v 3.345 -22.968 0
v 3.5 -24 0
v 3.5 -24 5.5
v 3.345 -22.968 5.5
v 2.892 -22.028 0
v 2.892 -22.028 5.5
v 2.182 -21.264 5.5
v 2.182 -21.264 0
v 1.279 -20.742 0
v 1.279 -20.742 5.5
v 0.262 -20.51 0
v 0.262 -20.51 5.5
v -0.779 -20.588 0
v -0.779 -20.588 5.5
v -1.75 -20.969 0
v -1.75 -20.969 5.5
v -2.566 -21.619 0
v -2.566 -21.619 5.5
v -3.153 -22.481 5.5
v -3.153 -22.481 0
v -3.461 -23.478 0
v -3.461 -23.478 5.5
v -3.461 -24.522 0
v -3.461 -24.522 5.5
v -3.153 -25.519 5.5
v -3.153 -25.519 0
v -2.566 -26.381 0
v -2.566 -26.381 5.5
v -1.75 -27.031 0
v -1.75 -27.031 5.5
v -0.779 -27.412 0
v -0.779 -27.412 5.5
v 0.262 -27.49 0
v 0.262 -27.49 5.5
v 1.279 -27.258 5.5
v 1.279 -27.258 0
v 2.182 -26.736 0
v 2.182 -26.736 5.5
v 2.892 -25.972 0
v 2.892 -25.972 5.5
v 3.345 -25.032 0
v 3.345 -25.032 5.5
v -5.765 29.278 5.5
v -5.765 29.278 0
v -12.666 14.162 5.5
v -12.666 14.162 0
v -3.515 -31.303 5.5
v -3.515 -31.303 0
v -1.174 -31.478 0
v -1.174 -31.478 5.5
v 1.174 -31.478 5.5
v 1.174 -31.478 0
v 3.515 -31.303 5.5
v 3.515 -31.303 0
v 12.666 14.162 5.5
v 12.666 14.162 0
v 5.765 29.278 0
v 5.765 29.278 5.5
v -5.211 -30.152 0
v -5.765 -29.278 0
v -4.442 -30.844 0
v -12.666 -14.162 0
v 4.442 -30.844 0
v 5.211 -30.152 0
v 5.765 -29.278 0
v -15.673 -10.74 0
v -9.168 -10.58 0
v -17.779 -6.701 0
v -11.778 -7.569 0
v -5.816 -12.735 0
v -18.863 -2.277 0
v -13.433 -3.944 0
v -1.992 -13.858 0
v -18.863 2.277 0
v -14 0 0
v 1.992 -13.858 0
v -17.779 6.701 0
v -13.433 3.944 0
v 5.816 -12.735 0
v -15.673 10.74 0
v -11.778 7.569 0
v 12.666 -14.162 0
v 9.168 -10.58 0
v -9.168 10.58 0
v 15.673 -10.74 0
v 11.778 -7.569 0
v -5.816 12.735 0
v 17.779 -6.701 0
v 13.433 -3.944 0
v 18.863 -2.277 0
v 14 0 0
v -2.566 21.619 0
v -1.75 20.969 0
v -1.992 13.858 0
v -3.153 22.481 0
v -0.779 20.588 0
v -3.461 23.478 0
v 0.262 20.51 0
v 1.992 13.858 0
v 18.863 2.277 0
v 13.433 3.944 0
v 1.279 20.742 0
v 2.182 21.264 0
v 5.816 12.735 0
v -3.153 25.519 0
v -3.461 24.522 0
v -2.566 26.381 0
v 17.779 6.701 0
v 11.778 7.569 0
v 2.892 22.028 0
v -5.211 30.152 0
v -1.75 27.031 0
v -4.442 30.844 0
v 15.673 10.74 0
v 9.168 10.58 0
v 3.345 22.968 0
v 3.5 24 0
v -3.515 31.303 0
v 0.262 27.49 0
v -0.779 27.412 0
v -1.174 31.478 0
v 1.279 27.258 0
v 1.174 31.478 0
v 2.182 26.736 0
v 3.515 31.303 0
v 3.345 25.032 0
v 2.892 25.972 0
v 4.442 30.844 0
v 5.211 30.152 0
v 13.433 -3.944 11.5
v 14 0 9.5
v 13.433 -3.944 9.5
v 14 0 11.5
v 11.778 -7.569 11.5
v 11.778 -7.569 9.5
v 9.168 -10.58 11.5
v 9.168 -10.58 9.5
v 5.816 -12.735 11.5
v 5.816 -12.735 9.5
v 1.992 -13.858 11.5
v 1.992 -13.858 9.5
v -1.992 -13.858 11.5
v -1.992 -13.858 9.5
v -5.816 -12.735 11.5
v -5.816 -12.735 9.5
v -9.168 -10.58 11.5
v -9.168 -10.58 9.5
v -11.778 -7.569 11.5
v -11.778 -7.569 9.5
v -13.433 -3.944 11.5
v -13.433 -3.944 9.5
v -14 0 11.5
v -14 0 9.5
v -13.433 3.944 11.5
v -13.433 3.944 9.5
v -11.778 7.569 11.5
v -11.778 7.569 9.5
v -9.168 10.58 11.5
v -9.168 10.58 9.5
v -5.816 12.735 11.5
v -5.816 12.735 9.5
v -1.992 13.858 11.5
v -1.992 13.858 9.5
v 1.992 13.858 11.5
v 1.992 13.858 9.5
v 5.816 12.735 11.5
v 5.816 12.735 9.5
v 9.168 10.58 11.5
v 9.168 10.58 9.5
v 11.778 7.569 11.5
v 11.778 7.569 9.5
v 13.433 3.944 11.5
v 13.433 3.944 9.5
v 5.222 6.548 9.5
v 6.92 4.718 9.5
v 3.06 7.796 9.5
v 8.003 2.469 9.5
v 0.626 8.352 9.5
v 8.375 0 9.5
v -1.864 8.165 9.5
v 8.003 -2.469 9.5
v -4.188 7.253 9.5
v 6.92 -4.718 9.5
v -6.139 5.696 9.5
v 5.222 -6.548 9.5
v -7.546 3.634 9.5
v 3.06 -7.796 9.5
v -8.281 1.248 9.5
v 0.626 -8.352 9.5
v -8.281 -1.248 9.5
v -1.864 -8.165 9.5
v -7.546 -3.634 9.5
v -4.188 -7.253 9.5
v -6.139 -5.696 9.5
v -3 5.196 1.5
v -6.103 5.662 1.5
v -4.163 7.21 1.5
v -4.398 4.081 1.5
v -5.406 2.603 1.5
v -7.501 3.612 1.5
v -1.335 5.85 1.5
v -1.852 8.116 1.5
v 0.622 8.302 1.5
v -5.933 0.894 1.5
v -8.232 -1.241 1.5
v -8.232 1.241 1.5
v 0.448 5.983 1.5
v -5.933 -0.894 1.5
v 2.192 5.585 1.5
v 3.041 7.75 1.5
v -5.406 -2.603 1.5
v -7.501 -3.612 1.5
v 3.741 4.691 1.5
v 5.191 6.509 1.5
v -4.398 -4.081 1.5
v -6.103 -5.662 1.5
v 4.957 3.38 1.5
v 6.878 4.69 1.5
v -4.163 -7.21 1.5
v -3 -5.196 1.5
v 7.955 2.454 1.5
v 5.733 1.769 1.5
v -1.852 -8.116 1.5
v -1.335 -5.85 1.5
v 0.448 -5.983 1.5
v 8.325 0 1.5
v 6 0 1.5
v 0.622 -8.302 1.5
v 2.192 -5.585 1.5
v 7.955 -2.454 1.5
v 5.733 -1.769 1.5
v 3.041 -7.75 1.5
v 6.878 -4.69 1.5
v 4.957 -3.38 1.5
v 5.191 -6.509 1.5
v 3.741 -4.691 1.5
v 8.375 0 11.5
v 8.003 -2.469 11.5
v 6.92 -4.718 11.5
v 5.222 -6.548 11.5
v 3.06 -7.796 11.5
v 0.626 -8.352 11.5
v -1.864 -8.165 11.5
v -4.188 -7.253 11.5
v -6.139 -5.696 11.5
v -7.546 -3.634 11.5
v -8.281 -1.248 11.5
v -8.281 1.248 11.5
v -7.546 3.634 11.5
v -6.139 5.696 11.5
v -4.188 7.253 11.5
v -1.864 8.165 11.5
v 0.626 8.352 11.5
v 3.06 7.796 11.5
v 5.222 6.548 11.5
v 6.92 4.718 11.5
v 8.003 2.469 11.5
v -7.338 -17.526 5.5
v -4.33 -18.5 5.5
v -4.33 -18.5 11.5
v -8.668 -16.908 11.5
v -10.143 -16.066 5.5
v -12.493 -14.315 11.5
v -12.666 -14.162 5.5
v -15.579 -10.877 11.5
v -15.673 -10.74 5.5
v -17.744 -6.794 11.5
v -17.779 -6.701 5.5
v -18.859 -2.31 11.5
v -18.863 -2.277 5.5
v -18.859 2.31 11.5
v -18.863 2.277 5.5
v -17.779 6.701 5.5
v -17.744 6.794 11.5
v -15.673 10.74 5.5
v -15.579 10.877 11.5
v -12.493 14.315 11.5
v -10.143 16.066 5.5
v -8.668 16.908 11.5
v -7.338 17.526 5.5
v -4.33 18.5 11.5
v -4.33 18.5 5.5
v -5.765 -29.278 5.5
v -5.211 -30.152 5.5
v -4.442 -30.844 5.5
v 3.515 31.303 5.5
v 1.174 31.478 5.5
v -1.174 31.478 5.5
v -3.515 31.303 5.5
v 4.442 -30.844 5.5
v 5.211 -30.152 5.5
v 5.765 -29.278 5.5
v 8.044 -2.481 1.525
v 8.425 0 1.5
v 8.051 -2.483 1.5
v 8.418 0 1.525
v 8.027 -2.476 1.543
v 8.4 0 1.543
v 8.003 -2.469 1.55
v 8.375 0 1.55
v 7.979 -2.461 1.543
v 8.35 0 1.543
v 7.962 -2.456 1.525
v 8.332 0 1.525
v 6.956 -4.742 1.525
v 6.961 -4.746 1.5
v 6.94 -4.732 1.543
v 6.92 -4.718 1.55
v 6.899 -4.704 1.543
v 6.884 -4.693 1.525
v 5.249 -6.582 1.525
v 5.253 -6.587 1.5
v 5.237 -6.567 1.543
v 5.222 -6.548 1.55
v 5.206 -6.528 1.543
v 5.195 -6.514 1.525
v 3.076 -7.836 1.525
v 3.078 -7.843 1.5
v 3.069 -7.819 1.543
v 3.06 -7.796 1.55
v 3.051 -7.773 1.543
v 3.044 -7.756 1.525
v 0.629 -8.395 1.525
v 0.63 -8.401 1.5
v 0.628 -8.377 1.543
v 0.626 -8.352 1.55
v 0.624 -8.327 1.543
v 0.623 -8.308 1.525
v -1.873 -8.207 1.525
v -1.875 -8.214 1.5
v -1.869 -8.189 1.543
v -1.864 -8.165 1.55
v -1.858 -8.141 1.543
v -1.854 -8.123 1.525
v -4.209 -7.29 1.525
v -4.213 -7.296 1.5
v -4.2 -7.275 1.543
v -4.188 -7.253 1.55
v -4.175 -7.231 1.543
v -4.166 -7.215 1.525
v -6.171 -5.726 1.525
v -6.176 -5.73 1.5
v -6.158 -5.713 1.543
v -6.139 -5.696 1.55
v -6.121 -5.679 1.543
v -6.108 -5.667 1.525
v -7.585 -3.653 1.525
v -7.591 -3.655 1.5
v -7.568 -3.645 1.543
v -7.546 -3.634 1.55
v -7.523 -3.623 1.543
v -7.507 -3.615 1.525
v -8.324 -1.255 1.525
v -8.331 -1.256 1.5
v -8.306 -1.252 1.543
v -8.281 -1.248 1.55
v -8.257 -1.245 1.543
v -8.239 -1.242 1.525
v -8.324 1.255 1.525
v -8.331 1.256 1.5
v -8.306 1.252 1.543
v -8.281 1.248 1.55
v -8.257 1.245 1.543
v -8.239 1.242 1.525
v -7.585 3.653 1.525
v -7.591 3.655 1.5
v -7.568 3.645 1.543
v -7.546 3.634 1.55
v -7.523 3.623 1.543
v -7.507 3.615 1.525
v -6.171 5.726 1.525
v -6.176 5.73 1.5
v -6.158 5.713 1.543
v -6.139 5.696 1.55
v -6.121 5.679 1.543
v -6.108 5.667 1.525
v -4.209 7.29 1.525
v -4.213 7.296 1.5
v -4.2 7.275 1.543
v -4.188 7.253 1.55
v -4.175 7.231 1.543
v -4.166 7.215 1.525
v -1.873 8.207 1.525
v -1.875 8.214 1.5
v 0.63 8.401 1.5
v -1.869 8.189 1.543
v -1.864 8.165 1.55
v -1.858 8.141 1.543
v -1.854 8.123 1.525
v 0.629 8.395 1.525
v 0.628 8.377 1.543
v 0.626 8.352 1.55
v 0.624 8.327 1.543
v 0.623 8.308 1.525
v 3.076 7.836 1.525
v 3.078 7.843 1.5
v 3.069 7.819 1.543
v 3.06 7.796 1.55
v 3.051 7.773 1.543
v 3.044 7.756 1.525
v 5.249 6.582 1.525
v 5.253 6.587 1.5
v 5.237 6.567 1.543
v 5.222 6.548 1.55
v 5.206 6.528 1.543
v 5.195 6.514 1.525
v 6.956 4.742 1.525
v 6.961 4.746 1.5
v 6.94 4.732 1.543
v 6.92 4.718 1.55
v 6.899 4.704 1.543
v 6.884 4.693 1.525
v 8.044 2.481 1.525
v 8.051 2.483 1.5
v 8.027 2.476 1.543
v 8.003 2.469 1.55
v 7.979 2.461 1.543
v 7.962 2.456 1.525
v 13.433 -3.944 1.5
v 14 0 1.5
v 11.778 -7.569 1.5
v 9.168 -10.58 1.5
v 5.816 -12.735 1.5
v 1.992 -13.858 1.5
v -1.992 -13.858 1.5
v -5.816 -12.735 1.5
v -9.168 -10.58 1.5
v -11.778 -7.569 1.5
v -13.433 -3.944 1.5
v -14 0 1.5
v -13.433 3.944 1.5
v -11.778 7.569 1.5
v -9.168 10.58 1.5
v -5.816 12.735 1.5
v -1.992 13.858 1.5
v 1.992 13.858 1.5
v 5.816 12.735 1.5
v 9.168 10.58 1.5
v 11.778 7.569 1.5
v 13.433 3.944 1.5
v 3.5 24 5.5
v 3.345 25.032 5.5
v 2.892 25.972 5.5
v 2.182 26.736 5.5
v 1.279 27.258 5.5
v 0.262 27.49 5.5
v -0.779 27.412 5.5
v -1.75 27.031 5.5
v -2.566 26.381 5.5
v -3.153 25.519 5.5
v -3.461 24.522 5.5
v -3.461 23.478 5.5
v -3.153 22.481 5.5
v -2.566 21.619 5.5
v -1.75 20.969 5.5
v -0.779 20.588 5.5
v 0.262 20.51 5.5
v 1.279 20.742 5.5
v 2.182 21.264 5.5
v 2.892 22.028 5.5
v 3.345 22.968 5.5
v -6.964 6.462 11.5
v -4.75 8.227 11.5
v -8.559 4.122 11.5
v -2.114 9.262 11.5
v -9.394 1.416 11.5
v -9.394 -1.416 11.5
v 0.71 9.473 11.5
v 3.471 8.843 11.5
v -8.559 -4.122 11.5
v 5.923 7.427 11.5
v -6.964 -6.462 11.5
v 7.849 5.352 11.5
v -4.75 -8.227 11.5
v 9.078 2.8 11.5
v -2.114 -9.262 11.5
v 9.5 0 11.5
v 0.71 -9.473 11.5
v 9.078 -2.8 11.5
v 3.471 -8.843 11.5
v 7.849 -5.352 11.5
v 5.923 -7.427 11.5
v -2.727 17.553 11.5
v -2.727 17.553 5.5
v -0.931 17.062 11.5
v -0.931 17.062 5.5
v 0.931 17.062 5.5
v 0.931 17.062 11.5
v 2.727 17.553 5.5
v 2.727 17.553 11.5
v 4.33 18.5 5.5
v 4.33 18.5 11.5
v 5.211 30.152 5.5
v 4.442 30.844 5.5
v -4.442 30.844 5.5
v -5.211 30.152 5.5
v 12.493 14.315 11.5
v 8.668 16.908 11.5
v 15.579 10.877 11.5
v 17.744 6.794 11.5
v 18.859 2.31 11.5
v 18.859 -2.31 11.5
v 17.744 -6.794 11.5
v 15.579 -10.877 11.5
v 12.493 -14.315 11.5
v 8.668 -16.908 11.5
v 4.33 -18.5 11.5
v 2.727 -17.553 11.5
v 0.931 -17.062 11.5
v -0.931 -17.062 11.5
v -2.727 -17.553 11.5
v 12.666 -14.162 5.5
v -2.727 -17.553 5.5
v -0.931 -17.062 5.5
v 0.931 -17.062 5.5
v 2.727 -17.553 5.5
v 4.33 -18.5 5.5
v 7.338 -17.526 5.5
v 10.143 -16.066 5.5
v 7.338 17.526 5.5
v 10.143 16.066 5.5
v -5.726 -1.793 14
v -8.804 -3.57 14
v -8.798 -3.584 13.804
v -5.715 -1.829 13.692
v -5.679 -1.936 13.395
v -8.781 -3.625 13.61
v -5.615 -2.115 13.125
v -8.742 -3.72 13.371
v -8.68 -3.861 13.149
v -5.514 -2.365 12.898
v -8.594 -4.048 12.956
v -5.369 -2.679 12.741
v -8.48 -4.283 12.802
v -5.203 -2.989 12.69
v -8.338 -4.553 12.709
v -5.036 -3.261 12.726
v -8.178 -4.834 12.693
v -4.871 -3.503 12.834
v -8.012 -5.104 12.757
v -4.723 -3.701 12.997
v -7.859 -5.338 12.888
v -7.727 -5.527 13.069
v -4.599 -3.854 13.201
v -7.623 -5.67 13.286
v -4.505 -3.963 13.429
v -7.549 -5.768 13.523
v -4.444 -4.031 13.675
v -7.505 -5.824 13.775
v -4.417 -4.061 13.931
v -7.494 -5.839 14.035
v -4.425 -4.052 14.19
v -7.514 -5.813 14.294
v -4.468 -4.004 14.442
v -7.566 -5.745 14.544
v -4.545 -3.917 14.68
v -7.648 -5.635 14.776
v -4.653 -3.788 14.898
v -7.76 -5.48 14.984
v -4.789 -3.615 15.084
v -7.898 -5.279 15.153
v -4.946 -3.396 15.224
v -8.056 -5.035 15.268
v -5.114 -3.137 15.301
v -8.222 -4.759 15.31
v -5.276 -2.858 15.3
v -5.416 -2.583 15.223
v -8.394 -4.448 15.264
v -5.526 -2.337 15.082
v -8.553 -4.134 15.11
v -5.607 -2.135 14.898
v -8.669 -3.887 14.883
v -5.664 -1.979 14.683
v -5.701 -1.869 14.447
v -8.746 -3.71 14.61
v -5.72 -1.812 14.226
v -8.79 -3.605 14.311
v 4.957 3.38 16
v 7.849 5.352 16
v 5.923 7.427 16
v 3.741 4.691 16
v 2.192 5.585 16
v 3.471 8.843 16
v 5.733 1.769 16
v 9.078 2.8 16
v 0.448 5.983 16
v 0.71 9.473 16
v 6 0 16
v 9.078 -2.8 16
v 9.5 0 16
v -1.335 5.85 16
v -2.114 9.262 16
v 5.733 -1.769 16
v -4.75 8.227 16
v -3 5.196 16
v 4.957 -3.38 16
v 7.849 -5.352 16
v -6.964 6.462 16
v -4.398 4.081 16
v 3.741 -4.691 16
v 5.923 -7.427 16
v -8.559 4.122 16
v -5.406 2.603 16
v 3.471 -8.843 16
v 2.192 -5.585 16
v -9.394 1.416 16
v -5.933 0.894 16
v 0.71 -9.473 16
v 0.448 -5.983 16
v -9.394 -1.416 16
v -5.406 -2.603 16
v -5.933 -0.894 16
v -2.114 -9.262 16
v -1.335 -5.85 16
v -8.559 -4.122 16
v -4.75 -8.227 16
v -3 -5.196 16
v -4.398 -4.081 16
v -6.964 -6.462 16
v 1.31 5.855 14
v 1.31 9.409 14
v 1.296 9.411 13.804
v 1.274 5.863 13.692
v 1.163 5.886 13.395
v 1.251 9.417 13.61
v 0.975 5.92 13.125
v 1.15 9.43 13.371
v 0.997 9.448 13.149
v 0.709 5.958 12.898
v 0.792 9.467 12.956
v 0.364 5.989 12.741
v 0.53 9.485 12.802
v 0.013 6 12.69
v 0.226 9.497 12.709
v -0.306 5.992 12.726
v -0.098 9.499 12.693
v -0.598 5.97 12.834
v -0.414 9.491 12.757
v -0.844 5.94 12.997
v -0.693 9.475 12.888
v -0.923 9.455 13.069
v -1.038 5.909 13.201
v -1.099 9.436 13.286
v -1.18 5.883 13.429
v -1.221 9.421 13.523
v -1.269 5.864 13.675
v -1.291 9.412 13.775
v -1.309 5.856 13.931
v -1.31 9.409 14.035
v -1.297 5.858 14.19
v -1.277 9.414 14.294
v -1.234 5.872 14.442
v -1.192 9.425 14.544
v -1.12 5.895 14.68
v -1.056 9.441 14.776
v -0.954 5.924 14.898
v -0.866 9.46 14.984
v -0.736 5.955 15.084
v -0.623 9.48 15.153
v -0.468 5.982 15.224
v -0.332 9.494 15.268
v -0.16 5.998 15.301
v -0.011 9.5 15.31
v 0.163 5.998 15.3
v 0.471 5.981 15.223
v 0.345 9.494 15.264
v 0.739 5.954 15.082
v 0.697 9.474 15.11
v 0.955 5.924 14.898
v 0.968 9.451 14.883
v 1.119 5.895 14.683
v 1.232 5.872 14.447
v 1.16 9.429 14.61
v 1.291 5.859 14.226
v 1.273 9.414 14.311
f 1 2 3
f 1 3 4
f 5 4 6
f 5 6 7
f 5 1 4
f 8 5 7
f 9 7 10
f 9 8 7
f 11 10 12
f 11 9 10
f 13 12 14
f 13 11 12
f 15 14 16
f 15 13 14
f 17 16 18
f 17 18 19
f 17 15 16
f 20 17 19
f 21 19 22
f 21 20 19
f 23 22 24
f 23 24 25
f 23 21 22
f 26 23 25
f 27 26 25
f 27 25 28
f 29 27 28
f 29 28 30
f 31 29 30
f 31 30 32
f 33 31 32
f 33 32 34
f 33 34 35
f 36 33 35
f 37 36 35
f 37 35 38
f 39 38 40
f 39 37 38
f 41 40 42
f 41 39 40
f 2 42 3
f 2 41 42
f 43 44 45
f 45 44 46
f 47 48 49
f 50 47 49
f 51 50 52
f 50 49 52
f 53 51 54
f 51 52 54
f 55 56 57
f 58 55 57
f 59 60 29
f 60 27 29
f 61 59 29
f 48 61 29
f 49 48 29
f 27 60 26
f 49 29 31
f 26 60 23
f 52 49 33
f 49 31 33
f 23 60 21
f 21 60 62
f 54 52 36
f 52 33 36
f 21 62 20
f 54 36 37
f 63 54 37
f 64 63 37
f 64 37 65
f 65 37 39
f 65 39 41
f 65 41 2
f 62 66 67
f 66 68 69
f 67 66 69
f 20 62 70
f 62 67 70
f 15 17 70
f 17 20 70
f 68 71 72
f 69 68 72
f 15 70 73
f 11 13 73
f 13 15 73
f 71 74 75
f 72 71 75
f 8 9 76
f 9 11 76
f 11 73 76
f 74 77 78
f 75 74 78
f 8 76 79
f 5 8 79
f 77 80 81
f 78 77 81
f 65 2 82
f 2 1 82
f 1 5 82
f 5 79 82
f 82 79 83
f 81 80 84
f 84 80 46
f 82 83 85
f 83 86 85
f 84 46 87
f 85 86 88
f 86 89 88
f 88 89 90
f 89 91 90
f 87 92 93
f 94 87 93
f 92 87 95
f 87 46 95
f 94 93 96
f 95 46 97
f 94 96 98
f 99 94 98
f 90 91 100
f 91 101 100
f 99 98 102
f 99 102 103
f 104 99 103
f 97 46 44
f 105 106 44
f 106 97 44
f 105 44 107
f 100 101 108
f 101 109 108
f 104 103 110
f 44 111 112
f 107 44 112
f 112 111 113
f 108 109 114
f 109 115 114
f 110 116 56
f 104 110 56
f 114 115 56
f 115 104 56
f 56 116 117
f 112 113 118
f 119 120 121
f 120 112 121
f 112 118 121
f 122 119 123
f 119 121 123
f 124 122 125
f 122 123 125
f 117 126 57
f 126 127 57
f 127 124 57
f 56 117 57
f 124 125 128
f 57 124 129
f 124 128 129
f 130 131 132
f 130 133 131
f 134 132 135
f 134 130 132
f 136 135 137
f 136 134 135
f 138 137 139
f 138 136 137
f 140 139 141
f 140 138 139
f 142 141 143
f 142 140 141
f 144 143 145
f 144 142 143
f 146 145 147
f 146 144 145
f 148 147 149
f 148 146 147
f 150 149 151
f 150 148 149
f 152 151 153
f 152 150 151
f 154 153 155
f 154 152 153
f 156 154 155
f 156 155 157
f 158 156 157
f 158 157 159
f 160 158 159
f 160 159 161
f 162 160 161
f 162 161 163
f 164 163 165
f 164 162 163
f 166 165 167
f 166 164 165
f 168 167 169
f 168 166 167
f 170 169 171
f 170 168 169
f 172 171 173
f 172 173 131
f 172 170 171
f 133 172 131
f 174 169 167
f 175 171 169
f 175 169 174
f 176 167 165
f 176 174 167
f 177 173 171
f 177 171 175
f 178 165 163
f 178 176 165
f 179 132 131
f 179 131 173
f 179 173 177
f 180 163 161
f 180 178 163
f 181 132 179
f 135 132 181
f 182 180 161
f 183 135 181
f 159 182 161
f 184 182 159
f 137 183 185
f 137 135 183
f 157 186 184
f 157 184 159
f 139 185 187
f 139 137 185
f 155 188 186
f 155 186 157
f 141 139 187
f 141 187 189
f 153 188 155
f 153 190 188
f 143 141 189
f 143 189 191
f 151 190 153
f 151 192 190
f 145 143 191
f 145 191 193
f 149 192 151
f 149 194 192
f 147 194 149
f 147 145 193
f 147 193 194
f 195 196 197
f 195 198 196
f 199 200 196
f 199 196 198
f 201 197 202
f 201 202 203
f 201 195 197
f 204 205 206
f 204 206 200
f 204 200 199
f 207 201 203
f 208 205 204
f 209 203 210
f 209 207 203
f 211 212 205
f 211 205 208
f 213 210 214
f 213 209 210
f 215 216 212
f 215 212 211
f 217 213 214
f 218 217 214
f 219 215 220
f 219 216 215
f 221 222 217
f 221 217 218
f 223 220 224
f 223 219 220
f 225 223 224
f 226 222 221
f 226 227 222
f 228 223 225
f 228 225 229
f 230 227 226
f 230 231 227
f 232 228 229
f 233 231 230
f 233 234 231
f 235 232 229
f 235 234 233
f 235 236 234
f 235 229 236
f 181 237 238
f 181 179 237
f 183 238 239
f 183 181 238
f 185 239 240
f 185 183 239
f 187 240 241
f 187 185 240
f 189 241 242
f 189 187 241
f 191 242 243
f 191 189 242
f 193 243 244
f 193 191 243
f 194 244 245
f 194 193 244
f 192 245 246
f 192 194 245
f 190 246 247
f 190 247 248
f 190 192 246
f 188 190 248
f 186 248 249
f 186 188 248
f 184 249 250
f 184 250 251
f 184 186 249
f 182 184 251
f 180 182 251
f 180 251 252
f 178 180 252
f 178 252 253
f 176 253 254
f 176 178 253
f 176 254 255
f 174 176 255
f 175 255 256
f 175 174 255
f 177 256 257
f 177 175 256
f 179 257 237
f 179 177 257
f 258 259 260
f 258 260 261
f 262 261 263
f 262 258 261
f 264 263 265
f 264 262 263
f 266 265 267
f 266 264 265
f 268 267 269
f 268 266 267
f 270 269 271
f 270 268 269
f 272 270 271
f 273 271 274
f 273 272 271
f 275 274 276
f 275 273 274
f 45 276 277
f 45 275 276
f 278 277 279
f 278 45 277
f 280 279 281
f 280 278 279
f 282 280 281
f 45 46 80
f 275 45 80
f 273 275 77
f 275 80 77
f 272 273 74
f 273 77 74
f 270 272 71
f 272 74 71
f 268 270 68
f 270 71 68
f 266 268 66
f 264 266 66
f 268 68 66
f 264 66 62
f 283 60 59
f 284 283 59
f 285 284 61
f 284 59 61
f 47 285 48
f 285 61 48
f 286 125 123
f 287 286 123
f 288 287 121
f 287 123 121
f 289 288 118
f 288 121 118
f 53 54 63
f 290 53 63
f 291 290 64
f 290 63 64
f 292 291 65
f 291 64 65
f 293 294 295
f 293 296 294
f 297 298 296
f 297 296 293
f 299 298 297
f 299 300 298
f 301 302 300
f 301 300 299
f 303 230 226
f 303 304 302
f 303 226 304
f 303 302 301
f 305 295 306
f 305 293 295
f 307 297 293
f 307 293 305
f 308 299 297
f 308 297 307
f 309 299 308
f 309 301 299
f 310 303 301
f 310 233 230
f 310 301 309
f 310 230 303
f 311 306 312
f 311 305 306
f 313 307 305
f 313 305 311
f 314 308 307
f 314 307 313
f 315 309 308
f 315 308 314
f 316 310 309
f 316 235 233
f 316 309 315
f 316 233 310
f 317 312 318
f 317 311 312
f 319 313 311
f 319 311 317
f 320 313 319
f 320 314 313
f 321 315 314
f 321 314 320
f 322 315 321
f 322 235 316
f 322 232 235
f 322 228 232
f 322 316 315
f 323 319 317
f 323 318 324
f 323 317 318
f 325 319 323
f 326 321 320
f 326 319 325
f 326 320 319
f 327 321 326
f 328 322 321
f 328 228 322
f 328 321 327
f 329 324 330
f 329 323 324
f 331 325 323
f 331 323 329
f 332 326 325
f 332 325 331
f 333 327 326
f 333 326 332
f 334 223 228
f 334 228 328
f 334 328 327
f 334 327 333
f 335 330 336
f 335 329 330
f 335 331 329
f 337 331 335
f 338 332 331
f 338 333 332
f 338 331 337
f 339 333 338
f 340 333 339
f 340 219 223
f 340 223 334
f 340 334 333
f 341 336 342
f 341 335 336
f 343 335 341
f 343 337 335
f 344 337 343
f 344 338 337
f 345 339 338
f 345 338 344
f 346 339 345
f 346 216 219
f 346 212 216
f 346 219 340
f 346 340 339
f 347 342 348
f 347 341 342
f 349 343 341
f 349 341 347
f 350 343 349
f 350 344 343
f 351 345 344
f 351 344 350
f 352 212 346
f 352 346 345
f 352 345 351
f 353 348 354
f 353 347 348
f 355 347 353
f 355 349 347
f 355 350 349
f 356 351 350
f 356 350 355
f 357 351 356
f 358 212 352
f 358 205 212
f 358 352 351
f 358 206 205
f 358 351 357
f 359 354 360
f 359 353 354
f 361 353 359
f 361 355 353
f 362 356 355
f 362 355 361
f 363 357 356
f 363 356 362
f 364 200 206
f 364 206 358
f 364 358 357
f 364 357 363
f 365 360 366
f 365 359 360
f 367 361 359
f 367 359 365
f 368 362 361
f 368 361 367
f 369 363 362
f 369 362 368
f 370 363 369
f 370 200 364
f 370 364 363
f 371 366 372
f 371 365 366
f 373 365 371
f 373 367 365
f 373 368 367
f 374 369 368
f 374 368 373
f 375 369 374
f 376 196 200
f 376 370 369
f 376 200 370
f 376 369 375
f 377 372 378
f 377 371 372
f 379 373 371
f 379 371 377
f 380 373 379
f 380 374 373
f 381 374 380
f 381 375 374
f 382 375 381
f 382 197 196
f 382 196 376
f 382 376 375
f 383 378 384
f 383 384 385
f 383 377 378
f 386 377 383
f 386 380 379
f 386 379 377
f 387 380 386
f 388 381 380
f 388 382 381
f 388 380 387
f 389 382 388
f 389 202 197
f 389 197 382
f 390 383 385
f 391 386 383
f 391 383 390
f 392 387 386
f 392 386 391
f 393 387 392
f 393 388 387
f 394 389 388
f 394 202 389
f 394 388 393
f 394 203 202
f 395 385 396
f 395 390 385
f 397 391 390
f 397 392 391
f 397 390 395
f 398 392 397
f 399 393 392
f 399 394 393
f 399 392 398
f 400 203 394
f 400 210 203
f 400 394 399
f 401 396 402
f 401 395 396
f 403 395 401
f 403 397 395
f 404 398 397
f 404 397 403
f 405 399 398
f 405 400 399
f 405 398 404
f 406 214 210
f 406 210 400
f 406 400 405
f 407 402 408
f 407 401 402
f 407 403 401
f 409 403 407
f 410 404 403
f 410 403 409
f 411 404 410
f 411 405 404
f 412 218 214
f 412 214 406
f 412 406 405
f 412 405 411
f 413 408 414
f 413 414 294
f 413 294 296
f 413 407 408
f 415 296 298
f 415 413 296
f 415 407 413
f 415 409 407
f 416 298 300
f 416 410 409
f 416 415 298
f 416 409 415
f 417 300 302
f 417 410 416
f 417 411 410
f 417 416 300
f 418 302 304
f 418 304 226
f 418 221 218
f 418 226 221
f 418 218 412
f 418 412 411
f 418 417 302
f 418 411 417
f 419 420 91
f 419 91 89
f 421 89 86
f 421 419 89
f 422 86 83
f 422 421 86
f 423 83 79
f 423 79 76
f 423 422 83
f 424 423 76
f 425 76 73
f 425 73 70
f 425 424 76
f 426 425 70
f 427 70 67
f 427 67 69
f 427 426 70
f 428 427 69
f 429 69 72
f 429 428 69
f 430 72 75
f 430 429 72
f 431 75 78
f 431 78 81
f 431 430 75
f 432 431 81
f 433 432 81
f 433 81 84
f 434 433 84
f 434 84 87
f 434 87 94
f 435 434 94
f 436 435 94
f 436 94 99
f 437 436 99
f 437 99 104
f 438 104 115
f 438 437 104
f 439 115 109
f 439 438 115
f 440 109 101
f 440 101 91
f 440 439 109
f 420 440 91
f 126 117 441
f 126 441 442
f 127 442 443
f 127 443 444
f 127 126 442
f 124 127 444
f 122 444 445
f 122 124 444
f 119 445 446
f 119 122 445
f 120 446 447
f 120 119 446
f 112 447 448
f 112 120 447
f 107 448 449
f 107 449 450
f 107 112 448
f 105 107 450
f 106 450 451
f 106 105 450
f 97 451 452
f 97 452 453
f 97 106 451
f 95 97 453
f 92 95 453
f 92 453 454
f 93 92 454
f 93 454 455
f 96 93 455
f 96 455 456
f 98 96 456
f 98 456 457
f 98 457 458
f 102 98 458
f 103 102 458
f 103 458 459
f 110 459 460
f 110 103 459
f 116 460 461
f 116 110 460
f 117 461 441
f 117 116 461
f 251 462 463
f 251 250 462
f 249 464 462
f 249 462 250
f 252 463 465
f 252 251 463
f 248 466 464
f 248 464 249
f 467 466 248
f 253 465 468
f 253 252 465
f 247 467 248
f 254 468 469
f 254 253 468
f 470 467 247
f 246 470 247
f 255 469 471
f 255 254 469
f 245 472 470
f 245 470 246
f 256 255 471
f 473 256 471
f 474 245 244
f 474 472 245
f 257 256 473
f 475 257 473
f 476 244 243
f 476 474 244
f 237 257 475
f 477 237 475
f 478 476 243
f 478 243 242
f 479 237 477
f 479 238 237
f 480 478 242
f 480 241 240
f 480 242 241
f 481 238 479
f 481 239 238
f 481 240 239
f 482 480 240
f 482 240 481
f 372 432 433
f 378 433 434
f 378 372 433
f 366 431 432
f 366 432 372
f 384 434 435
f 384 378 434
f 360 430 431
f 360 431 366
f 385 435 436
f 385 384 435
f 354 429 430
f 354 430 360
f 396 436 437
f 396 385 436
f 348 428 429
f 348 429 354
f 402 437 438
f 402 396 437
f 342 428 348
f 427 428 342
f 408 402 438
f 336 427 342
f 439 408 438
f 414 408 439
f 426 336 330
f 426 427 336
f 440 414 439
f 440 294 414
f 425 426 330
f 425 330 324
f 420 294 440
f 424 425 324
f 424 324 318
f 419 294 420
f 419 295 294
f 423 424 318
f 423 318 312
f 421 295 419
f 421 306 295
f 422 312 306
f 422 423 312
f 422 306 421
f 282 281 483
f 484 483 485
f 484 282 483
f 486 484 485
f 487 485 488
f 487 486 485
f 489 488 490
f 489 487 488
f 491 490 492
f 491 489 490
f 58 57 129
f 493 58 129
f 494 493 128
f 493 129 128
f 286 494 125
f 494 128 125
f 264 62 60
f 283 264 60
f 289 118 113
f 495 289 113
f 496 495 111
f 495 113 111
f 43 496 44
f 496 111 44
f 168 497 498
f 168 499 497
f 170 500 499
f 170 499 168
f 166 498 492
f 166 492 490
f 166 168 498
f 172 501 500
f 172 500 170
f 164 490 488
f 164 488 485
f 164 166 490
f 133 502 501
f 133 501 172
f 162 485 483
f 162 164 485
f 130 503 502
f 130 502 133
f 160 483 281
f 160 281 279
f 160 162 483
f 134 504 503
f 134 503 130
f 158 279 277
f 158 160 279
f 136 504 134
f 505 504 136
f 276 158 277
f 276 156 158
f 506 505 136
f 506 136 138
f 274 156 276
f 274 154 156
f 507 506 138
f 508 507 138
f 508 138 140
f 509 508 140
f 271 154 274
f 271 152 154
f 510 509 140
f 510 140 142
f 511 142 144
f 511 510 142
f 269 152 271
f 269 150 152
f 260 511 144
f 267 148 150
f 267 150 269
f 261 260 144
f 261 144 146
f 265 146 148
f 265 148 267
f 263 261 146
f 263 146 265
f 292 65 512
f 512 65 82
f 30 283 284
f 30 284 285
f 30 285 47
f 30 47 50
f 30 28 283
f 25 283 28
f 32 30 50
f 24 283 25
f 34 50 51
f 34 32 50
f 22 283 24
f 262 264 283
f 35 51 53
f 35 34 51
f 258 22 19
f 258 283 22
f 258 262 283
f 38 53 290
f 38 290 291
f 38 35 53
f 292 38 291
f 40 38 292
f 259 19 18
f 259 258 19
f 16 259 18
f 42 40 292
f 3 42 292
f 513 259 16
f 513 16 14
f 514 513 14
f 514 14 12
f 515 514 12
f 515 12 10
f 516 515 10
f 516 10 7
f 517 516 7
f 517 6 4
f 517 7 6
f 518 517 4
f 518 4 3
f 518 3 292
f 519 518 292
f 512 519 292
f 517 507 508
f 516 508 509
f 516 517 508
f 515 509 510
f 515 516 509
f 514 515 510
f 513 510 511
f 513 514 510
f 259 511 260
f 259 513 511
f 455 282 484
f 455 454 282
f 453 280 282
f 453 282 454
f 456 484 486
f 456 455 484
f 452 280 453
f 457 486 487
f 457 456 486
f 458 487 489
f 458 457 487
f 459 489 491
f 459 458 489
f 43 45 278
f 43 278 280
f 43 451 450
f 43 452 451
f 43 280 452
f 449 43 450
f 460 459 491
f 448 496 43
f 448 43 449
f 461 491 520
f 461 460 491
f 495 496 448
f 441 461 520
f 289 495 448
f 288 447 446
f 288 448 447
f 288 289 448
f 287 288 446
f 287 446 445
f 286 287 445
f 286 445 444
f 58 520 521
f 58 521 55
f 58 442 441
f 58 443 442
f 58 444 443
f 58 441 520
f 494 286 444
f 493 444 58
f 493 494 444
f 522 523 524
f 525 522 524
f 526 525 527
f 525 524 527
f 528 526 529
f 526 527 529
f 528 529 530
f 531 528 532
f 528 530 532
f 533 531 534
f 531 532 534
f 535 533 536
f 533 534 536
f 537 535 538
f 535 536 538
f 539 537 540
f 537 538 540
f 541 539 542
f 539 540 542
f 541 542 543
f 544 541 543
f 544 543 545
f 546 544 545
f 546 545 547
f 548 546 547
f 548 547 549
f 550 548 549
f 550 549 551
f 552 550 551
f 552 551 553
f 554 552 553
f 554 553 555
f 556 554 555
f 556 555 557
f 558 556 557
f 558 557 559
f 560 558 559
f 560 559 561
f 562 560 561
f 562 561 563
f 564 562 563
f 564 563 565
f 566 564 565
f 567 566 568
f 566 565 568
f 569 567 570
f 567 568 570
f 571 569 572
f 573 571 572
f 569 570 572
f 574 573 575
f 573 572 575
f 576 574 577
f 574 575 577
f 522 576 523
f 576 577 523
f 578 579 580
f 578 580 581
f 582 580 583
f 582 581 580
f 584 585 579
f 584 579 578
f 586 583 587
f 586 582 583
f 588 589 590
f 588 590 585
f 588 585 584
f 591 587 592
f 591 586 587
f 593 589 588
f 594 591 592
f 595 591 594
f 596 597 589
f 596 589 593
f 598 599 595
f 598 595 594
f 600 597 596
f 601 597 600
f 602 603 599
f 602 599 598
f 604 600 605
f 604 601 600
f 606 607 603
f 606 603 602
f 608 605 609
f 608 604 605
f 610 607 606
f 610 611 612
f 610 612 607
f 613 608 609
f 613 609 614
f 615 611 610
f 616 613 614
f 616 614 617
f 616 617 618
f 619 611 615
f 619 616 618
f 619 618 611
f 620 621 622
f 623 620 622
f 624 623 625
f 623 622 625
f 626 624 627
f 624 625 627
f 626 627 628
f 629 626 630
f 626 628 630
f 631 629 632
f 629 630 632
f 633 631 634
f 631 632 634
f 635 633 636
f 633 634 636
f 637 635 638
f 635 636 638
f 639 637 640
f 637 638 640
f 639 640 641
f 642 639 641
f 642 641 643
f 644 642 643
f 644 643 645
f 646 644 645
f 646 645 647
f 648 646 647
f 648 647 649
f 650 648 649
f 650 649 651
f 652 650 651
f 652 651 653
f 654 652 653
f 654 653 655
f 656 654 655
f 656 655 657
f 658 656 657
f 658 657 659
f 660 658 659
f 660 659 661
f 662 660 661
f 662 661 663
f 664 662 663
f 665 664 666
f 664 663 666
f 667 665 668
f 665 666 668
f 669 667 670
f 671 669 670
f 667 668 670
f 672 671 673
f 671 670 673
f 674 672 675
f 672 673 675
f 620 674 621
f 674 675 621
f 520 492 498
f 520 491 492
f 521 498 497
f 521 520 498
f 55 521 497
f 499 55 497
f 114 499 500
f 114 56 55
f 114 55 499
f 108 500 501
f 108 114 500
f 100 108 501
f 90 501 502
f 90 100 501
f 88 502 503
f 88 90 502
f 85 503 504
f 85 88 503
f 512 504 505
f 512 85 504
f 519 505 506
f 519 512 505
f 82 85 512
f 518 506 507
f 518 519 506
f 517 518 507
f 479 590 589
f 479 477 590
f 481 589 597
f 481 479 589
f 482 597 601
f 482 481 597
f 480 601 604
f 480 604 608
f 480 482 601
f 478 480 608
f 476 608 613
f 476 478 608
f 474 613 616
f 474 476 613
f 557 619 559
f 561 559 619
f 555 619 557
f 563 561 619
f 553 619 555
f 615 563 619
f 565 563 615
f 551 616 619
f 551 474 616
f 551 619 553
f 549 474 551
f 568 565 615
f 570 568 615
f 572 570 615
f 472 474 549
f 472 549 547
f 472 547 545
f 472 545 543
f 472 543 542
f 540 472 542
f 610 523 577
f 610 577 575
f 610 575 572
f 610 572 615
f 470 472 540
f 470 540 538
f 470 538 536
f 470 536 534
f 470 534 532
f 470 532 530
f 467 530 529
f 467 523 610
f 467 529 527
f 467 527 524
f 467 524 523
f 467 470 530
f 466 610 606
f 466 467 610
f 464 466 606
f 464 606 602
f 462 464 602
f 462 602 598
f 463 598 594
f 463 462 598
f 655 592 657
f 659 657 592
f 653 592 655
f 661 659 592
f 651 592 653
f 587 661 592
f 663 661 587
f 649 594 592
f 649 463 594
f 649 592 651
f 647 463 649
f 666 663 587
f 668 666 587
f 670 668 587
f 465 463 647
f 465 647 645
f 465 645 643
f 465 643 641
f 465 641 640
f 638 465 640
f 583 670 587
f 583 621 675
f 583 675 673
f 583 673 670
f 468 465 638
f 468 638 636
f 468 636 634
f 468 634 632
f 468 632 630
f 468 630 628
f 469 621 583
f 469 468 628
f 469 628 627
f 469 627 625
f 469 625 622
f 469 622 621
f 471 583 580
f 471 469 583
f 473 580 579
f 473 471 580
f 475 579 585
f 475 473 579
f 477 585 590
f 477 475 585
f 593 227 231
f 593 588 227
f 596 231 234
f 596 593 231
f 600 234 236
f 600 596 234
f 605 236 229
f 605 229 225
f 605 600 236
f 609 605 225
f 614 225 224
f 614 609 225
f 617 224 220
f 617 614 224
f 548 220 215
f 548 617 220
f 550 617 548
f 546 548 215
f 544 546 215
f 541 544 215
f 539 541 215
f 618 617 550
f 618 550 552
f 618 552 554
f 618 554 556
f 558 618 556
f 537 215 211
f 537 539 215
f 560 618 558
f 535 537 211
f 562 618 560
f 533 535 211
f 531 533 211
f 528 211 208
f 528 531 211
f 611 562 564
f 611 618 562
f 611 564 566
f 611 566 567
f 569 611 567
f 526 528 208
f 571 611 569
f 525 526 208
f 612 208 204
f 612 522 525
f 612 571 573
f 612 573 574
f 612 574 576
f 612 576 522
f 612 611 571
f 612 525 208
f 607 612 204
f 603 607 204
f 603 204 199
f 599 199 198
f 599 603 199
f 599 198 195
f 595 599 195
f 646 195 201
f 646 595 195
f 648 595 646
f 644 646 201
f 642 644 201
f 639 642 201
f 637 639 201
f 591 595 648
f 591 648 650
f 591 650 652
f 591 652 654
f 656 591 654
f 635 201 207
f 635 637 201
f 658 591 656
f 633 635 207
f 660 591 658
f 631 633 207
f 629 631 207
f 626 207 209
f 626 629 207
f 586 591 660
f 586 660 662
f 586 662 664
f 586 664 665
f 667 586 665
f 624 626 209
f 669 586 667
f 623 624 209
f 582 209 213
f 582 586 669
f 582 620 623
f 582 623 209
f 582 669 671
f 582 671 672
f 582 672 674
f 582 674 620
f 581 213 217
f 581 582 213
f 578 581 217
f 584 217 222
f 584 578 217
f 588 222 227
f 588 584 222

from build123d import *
from build123d.topology import SkipClean

# Parameters (mm, degrees)
SKETCH2_R           = 14
SKETCH2_R_2         = 3.5
BOSS_EXTRUDE1_DEPTH = 5.5
SKETCH3_R           = 7
CUT_EXTRUDE1_DEPTH  = 39.255719
TAP1_REACH          = 49.937
TAP1_BORE_R         = 1.3105
CIRPATTERN1_COUNT   = 2
CIRPATTERN1_ANGLE   = 120


with BuildPart() as part:
    # Sketch1 → Revolve1 (revolve)
    with BuildSketch(Plane(origin=(0, 0, 0), x_dir=(0, 0, -1), z_dir=(1, 0, 0)), mode=Mode.PRIVATE) as revolve1_sk:
        with BuildLine():
            Line((-11.5, 19), (0, 19))
            Line((0, 19), (0, 14))
            Line((0, 14), (-1.5, 14))
            Line((-1.5, 14), (-1.5, 8.425))
            ThreePointArc((-1.5, 8.425), (-1.55, 8.375), (-1.5, 8.325))
            Line((-1.5, 8.325), (-1.5, 6))
            Line((-1.5, 6), (-16, 6))
            Line((-16, 6), (-16, 9.5))
            Line((-16, 9.5), (-11.5, 9.5))
            Line((-11.5, 9.5), (-11.5, 8.375))
            Line((-11.5, 8.375), (-9.5, 8.375))
            Line((-9.5, 8.375), (-9.5, 14))
            Line((-9.5, 14), (-11.5, 14))
            Line((-11.5, 14), (-11.5, 19))
        make_face()
    revolve(revolve1_sk.sketch.rotate(Axis((0, 0, 16), (0, 0, -1)), 90), axis=Axis((0, 0, 16), (0, 0, -1)))

    # Sketch2 → Boss-Extrude1 (add)
    with SkipClean():  # the faces are left unmerged after this step: merging them gives an invalid solid
        with BuildSketch(Plane.XY):
            with BuildLine():
                Line((-5.76484, 29.278248), (-12.6665, 14.161913))
                ThreePointArc((-12.6665, 14.161913), (-19, 0), (-12.6665, -14.161913))
                Line((-12.6665, -14.161913), (-5.76484, -29.278248))
                ThreePointArc((-5.76484, -29.278248), (-4.850203, -30.524474), (-3.514877, -31.303285))
                ThreePointArc((-3.514877, -31.303285), (0, -31.5), (3.514877, -31.303285))
                ThreePointArc((3.514877, -31.303285), (4.850203, -30.524474), (5.76484, -29.278248))
                Line((5.76484, -29.278248), (12.6665, -14.161913))
                ThreePointArc((12.6665, -14.161913), (19, 0), (12.6665, 14.161913))
                Line((12.6665, 14.161913), (5.76484, 29.278248))
                ThreePointArc((5.76484, 29.278248), (4.850203, 30.524474), (3.514877, 31.303285))
                ThreePointArc((3.514877, 31.303285), (0, 31.5), (-3.514877, 31.303285))
                ThreePointArc((-3.514877, 31.303285), (-4.850203, 30.524474), (-5.76484, 29.278248))
            make_face()
            Circle(SKETCH2_R, mode=Mode.SUBTRACT)
            with Locations((0, 24)):
                Circle(SKETCH2_R_2, mode=Mode.SUBTRACT)
            with Locations((0, -24)):
                Circle(SKETCH2_R_2, mode=Mode.SUBTRACT)
        extrude(amount=BOSS_EXTRUDE1_DEPTH)

    # Sketch3 → Cut-Extrude1 (cut, through all)
    with SkipClean():  # the faces are left unmerged after this step: merging them gives an invalid solid
        with BuildSketch(Plane.XY.offset(5.5)):
            with Locations((0, 24)):
                Circle(SKETCH3_R)
            with Locations((0, -24)):
                Circle(SKETCH3_R)
        extrude(amount=CUT_EXTRUDE1_DEPTH, mode=Mode.SUBTRACT)

    # Tap1 bore → Tap1 (cut, up to next)
    with BuildSketch(Plane(origin=(0, 9.5, 0), x_dir=(1, 0, 0), z_dir=(0, 1, 0)), mode=Mode.PRIVATE) as tap1_sk1:
        with Locations((0, -14)):
            Circle(TAP1_BORE_R)
    tap1_tool1 = extrude(tap1_sk1.sketch, amount=-TAP1_REACH, mode=Mode.PRIVATE) & part.part
    tap1 = tap1_tool1.solids().sort_by_distance((0, 9.5, 14))[0]
    add(tap1, mode=Mode.SUBTRACT)

    # CirPattern1: Tap1 ×2 about axis
    with SkipClean():  # the faces are left unmerged after this step: merging them gives an invalid solid
        cirpattern1_axis = Axis((0, 0, 16), (0, 0, 1))
        for i in range(1, CIRPATTERN1_COUNT):
            add(tap1.rotate(cirpattern1_axis, i * CIRPATTERN1_ANGLE / (CIRPATTERN1_COUNT - 1)), mode=Mode.SUBTRACT)


solid = part.part
